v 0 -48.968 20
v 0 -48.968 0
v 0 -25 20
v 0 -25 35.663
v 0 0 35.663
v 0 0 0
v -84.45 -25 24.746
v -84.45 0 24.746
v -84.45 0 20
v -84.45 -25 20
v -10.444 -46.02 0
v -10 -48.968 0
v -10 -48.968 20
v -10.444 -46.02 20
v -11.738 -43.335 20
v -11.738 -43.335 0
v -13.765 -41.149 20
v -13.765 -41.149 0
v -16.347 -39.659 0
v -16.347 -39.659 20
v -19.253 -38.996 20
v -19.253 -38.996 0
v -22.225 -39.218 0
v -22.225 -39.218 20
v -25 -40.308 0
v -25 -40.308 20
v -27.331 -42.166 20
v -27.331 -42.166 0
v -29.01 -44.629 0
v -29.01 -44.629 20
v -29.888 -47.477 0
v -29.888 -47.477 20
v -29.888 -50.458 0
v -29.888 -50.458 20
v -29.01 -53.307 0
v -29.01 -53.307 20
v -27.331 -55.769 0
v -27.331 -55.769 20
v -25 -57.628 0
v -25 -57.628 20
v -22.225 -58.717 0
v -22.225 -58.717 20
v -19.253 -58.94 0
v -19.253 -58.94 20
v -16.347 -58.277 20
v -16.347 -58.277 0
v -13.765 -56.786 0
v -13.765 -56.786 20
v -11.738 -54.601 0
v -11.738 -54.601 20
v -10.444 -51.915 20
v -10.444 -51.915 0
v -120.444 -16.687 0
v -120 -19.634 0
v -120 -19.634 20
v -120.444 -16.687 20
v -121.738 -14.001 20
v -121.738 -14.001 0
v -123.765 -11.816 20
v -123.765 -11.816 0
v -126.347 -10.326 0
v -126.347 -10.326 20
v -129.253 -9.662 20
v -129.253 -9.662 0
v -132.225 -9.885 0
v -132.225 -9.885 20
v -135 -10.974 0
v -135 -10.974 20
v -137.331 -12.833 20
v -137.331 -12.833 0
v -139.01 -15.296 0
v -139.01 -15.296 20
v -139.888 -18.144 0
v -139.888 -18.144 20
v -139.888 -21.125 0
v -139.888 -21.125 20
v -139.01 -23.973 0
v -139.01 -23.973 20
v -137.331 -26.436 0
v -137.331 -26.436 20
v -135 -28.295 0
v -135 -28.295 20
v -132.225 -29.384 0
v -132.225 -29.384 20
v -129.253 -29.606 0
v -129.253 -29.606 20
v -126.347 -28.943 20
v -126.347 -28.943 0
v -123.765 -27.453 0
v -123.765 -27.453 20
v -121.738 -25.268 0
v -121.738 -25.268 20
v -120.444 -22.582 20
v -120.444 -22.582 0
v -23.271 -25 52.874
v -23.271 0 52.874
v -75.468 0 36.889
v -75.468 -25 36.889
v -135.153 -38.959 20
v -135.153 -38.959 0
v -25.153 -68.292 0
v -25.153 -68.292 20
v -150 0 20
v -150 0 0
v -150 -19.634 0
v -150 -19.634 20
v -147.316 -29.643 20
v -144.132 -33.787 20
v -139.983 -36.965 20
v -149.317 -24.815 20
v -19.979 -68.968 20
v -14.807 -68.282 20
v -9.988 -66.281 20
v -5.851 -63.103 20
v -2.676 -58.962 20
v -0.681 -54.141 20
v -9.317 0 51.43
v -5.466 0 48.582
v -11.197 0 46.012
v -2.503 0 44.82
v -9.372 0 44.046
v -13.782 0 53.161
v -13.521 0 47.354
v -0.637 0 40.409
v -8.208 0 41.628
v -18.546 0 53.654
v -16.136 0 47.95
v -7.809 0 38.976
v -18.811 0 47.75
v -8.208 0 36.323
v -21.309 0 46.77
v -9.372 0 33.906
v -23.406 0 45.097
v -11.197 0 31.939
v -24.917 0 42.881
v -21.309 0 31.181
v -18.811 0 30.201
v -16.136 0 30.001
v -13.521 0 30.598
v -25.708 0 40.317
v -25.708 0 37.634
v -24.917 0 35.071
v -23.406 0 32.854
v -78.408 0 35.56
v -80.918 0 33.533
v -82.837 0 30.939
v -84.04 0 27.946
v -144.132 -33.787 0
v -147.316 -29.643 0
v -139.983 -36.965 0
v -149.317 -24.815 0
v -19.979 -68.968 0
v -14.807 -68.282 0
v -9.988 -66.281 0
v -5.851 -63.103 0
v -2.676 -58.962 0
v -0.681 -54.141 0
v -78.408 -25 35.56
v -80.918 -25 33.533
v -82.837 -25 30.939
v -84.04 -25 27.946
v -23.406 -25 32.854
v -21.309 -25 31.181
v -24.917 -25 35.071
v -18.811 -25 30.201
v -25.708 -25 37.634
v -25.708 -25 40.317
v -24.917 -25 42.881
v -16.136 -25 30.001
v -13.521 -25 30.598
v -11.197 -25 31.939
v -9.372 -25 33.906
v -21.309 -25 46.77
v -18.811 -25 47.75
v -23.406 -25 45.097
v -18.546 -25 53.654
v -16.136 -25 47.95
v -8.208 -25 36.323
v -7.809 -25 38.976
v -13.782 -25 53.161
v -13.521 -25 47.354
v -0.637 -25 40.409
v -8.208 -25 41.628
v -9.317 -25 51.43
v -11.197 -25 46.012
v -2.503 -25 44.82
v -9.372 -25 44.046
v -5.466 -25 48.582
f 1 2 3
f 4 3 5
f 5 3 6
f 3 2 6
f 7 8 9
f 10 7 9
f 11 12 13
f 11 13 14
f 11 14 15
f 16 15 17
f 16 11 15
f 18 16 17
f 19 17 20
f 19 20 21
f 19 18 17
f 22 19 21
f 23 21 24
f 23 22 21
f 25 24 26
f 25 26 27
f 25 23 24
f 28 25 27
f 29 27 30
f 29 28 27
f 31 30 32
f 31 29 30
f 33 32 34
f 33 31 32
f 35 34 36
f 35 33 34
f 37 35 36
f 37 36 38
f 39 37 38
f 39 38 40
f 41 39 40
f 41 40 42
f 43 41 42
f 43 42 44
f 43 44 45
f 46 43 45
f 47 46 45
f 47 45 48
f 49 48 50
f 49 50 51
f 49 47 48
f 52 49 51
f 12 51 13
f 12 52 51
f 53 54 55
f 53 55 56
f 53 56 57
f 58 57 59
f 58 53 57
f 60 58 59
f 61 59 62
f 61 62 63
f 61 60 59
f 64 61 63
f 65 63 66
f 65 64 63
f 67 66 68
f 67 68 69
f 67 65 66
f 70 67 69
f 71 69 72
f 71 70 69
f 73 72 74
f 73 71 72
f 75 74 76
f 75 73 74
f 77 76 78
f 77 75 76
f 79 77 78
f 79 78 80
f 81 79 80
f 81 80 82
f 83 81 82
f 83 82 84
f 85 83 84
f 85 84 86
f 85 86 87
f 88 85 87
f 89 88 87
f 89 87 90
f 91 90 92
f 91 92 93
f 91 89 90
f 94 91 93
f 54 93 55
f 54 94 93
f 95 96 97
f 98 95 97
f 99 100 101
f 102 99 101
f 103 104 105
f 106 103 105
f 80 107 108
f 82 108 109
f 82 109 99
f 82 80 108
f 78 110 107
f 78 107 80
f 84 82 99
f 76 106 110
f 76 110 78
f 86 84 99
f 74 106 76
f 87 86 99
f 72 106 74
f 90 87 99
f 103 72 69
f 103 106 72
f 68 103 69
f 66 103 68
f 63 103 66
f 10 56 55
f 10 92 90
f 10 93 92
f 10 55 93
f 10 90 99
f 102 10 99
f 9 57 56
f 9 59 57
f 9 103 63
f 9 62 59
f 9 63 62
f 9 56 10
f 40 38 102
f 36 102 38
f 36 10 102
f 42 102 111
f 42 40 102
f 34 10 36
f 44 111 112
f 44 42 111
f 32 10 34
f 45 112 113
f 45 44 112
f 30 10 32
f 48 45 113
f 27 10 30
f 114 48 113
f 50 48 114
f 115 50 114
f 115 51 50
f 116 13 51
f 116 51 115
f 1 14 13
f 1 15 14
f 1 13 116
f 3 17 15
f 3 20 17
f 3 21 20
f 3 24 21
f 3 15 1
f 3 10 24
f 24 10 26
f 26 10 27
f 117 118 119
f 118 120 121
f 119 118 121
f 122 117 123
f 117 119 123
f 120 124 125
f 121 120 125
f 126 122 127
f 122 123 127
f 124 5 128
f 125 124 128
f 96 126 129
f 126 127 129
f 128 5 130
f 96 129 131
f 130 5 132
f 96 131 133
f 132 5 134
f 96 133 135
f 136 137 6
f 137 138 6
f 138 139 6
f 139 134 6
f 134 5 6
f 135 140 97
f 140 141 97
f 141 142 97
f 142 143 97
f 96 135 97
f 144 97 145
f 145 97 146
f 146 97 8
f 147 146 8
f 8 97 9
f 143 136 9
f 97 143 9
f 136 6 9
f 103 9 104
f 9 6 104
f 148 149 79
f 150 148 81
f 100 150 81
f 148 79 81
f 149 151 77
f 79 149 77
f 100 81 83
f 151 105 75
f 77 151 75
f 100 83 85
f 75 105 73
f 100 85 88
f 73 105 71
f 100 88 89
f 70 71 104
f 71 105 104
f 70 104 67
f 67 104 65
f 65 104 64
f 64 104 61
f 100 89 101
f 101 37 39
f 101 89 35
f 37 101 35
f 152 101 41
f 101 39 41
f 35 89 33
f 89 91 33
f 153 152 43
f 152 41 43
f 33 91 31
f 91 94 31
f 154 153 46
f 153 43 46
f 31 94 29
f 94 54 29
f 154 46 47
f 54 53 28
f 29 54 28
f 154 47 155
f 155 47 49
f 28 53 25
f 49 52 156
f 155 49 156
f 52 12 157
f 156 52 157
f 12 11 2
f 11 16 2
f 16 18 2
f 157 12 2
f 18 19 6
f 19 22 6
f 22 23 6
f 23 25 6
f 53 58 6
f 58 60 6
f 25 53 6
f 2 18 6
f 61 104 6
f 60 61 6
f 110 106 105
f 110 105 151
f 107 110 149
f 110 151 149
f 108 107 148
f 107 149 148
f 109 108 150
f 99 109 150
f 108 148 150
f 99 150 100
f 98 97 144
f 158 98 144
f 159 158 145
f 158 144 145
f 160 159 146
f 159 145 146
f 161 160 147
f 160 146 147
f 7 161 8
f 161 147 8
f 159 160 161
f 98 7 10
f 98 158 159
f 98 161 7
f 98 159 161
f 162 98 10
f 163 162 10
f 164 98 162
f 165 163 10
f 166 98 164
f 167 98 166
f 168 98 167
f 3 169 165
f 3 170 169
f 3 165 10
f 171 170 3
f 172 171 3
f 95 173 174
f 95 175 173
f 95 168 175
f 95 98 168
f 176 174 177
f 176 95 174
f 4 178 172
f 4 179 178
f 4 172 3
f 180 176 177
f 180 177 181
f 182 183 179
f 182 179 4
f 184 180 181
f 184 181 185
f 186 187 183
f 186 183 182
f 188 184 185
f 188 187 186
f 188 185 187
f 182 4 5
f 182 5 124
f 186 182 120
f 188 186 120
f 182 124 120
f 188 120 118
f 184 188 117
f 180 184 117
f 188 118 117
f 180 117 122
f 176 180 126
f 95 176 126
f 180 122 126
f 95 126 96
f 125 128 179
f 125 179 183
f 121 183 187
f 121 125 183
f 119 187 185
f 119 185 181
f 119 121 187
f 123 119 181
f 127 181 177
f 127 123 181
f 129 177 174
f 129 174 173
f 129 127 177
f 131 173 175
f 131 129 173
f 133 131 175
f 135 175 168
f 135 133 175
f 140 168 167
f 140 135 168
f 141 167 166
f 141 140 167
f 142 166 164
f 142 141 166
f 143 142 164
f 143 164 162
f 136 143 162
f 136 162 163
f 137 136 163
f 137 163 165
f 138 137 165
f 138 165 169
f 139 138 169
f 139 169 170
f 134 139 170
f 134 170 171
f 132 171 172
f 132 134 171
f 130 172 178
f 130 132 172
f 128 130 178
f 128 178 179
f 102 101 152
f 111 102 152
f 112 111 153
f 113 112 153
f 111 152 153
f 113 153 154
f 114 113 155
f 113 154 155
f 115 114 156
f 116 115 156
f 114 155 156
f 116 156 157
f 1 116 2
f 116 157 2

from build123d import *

# Parameters (mm, degrees)
F0_R     = 10
F1_DEPTH = 20
F2_R     = 9
F3_DEPTH = 25


with BuildPart() as f1:
    # F0 (on Top) → F1 (new body)
    with BuildSketch(Plane.XY):
        with BuildLine():
            Line((0, -48.967767), (0, 0))
            Line((0, 0), (-150, 0))
            Line((-150, 0), (-150, -19.634434))
            ThreePointArc((-150, -19.634434), (-145.859777, -31.819157), (-135.153253, -38.959133))
            Line((-135.153253, -38.959133), (-25.153253, -68.292466))
            ThreePointArc((-25.153253, -68.292466), (-7.815277, -64.827544), (0, -48.967767))
        make_face()
        with Locations((-20, -48.967767)):
            Circle(F0_R, mode=Mode.SUBTRACT)
        with Locations((-130, -19.634434)):
            Circle(F0_R, mode=Mode.SUBTRACT)
    extrude(amount=F1_DEPTH)

    # F2 (on Front) → F3 (join)
    with BuildSketch(Plane.XZ):
        with BuildLine():
            Line((-84.449692, 0), (0, 0))
            Line((0, 0), (0, 35.662658))
            ThreePointArc((0, 35.662658), (-7.296527, 50.134551), (-23.270631, 52.873714))
            Line((-23.270631, 52.873714), (-75.468414, 36.888917))
            ThreePointArc((-75.468414, 36.888917), (-81.960416, 32.297455), (-84.449692, 24.745561))
            Line((-84.449692, 24.745561), (-84.449692, 0))
        make_face()
        with Locations((-16.808609, 38.975652)):
            Circle(F2_R, mode=Mode.SUBTRACT)
    extrude(amount=F3_DEPTH)


solid = f1.part
